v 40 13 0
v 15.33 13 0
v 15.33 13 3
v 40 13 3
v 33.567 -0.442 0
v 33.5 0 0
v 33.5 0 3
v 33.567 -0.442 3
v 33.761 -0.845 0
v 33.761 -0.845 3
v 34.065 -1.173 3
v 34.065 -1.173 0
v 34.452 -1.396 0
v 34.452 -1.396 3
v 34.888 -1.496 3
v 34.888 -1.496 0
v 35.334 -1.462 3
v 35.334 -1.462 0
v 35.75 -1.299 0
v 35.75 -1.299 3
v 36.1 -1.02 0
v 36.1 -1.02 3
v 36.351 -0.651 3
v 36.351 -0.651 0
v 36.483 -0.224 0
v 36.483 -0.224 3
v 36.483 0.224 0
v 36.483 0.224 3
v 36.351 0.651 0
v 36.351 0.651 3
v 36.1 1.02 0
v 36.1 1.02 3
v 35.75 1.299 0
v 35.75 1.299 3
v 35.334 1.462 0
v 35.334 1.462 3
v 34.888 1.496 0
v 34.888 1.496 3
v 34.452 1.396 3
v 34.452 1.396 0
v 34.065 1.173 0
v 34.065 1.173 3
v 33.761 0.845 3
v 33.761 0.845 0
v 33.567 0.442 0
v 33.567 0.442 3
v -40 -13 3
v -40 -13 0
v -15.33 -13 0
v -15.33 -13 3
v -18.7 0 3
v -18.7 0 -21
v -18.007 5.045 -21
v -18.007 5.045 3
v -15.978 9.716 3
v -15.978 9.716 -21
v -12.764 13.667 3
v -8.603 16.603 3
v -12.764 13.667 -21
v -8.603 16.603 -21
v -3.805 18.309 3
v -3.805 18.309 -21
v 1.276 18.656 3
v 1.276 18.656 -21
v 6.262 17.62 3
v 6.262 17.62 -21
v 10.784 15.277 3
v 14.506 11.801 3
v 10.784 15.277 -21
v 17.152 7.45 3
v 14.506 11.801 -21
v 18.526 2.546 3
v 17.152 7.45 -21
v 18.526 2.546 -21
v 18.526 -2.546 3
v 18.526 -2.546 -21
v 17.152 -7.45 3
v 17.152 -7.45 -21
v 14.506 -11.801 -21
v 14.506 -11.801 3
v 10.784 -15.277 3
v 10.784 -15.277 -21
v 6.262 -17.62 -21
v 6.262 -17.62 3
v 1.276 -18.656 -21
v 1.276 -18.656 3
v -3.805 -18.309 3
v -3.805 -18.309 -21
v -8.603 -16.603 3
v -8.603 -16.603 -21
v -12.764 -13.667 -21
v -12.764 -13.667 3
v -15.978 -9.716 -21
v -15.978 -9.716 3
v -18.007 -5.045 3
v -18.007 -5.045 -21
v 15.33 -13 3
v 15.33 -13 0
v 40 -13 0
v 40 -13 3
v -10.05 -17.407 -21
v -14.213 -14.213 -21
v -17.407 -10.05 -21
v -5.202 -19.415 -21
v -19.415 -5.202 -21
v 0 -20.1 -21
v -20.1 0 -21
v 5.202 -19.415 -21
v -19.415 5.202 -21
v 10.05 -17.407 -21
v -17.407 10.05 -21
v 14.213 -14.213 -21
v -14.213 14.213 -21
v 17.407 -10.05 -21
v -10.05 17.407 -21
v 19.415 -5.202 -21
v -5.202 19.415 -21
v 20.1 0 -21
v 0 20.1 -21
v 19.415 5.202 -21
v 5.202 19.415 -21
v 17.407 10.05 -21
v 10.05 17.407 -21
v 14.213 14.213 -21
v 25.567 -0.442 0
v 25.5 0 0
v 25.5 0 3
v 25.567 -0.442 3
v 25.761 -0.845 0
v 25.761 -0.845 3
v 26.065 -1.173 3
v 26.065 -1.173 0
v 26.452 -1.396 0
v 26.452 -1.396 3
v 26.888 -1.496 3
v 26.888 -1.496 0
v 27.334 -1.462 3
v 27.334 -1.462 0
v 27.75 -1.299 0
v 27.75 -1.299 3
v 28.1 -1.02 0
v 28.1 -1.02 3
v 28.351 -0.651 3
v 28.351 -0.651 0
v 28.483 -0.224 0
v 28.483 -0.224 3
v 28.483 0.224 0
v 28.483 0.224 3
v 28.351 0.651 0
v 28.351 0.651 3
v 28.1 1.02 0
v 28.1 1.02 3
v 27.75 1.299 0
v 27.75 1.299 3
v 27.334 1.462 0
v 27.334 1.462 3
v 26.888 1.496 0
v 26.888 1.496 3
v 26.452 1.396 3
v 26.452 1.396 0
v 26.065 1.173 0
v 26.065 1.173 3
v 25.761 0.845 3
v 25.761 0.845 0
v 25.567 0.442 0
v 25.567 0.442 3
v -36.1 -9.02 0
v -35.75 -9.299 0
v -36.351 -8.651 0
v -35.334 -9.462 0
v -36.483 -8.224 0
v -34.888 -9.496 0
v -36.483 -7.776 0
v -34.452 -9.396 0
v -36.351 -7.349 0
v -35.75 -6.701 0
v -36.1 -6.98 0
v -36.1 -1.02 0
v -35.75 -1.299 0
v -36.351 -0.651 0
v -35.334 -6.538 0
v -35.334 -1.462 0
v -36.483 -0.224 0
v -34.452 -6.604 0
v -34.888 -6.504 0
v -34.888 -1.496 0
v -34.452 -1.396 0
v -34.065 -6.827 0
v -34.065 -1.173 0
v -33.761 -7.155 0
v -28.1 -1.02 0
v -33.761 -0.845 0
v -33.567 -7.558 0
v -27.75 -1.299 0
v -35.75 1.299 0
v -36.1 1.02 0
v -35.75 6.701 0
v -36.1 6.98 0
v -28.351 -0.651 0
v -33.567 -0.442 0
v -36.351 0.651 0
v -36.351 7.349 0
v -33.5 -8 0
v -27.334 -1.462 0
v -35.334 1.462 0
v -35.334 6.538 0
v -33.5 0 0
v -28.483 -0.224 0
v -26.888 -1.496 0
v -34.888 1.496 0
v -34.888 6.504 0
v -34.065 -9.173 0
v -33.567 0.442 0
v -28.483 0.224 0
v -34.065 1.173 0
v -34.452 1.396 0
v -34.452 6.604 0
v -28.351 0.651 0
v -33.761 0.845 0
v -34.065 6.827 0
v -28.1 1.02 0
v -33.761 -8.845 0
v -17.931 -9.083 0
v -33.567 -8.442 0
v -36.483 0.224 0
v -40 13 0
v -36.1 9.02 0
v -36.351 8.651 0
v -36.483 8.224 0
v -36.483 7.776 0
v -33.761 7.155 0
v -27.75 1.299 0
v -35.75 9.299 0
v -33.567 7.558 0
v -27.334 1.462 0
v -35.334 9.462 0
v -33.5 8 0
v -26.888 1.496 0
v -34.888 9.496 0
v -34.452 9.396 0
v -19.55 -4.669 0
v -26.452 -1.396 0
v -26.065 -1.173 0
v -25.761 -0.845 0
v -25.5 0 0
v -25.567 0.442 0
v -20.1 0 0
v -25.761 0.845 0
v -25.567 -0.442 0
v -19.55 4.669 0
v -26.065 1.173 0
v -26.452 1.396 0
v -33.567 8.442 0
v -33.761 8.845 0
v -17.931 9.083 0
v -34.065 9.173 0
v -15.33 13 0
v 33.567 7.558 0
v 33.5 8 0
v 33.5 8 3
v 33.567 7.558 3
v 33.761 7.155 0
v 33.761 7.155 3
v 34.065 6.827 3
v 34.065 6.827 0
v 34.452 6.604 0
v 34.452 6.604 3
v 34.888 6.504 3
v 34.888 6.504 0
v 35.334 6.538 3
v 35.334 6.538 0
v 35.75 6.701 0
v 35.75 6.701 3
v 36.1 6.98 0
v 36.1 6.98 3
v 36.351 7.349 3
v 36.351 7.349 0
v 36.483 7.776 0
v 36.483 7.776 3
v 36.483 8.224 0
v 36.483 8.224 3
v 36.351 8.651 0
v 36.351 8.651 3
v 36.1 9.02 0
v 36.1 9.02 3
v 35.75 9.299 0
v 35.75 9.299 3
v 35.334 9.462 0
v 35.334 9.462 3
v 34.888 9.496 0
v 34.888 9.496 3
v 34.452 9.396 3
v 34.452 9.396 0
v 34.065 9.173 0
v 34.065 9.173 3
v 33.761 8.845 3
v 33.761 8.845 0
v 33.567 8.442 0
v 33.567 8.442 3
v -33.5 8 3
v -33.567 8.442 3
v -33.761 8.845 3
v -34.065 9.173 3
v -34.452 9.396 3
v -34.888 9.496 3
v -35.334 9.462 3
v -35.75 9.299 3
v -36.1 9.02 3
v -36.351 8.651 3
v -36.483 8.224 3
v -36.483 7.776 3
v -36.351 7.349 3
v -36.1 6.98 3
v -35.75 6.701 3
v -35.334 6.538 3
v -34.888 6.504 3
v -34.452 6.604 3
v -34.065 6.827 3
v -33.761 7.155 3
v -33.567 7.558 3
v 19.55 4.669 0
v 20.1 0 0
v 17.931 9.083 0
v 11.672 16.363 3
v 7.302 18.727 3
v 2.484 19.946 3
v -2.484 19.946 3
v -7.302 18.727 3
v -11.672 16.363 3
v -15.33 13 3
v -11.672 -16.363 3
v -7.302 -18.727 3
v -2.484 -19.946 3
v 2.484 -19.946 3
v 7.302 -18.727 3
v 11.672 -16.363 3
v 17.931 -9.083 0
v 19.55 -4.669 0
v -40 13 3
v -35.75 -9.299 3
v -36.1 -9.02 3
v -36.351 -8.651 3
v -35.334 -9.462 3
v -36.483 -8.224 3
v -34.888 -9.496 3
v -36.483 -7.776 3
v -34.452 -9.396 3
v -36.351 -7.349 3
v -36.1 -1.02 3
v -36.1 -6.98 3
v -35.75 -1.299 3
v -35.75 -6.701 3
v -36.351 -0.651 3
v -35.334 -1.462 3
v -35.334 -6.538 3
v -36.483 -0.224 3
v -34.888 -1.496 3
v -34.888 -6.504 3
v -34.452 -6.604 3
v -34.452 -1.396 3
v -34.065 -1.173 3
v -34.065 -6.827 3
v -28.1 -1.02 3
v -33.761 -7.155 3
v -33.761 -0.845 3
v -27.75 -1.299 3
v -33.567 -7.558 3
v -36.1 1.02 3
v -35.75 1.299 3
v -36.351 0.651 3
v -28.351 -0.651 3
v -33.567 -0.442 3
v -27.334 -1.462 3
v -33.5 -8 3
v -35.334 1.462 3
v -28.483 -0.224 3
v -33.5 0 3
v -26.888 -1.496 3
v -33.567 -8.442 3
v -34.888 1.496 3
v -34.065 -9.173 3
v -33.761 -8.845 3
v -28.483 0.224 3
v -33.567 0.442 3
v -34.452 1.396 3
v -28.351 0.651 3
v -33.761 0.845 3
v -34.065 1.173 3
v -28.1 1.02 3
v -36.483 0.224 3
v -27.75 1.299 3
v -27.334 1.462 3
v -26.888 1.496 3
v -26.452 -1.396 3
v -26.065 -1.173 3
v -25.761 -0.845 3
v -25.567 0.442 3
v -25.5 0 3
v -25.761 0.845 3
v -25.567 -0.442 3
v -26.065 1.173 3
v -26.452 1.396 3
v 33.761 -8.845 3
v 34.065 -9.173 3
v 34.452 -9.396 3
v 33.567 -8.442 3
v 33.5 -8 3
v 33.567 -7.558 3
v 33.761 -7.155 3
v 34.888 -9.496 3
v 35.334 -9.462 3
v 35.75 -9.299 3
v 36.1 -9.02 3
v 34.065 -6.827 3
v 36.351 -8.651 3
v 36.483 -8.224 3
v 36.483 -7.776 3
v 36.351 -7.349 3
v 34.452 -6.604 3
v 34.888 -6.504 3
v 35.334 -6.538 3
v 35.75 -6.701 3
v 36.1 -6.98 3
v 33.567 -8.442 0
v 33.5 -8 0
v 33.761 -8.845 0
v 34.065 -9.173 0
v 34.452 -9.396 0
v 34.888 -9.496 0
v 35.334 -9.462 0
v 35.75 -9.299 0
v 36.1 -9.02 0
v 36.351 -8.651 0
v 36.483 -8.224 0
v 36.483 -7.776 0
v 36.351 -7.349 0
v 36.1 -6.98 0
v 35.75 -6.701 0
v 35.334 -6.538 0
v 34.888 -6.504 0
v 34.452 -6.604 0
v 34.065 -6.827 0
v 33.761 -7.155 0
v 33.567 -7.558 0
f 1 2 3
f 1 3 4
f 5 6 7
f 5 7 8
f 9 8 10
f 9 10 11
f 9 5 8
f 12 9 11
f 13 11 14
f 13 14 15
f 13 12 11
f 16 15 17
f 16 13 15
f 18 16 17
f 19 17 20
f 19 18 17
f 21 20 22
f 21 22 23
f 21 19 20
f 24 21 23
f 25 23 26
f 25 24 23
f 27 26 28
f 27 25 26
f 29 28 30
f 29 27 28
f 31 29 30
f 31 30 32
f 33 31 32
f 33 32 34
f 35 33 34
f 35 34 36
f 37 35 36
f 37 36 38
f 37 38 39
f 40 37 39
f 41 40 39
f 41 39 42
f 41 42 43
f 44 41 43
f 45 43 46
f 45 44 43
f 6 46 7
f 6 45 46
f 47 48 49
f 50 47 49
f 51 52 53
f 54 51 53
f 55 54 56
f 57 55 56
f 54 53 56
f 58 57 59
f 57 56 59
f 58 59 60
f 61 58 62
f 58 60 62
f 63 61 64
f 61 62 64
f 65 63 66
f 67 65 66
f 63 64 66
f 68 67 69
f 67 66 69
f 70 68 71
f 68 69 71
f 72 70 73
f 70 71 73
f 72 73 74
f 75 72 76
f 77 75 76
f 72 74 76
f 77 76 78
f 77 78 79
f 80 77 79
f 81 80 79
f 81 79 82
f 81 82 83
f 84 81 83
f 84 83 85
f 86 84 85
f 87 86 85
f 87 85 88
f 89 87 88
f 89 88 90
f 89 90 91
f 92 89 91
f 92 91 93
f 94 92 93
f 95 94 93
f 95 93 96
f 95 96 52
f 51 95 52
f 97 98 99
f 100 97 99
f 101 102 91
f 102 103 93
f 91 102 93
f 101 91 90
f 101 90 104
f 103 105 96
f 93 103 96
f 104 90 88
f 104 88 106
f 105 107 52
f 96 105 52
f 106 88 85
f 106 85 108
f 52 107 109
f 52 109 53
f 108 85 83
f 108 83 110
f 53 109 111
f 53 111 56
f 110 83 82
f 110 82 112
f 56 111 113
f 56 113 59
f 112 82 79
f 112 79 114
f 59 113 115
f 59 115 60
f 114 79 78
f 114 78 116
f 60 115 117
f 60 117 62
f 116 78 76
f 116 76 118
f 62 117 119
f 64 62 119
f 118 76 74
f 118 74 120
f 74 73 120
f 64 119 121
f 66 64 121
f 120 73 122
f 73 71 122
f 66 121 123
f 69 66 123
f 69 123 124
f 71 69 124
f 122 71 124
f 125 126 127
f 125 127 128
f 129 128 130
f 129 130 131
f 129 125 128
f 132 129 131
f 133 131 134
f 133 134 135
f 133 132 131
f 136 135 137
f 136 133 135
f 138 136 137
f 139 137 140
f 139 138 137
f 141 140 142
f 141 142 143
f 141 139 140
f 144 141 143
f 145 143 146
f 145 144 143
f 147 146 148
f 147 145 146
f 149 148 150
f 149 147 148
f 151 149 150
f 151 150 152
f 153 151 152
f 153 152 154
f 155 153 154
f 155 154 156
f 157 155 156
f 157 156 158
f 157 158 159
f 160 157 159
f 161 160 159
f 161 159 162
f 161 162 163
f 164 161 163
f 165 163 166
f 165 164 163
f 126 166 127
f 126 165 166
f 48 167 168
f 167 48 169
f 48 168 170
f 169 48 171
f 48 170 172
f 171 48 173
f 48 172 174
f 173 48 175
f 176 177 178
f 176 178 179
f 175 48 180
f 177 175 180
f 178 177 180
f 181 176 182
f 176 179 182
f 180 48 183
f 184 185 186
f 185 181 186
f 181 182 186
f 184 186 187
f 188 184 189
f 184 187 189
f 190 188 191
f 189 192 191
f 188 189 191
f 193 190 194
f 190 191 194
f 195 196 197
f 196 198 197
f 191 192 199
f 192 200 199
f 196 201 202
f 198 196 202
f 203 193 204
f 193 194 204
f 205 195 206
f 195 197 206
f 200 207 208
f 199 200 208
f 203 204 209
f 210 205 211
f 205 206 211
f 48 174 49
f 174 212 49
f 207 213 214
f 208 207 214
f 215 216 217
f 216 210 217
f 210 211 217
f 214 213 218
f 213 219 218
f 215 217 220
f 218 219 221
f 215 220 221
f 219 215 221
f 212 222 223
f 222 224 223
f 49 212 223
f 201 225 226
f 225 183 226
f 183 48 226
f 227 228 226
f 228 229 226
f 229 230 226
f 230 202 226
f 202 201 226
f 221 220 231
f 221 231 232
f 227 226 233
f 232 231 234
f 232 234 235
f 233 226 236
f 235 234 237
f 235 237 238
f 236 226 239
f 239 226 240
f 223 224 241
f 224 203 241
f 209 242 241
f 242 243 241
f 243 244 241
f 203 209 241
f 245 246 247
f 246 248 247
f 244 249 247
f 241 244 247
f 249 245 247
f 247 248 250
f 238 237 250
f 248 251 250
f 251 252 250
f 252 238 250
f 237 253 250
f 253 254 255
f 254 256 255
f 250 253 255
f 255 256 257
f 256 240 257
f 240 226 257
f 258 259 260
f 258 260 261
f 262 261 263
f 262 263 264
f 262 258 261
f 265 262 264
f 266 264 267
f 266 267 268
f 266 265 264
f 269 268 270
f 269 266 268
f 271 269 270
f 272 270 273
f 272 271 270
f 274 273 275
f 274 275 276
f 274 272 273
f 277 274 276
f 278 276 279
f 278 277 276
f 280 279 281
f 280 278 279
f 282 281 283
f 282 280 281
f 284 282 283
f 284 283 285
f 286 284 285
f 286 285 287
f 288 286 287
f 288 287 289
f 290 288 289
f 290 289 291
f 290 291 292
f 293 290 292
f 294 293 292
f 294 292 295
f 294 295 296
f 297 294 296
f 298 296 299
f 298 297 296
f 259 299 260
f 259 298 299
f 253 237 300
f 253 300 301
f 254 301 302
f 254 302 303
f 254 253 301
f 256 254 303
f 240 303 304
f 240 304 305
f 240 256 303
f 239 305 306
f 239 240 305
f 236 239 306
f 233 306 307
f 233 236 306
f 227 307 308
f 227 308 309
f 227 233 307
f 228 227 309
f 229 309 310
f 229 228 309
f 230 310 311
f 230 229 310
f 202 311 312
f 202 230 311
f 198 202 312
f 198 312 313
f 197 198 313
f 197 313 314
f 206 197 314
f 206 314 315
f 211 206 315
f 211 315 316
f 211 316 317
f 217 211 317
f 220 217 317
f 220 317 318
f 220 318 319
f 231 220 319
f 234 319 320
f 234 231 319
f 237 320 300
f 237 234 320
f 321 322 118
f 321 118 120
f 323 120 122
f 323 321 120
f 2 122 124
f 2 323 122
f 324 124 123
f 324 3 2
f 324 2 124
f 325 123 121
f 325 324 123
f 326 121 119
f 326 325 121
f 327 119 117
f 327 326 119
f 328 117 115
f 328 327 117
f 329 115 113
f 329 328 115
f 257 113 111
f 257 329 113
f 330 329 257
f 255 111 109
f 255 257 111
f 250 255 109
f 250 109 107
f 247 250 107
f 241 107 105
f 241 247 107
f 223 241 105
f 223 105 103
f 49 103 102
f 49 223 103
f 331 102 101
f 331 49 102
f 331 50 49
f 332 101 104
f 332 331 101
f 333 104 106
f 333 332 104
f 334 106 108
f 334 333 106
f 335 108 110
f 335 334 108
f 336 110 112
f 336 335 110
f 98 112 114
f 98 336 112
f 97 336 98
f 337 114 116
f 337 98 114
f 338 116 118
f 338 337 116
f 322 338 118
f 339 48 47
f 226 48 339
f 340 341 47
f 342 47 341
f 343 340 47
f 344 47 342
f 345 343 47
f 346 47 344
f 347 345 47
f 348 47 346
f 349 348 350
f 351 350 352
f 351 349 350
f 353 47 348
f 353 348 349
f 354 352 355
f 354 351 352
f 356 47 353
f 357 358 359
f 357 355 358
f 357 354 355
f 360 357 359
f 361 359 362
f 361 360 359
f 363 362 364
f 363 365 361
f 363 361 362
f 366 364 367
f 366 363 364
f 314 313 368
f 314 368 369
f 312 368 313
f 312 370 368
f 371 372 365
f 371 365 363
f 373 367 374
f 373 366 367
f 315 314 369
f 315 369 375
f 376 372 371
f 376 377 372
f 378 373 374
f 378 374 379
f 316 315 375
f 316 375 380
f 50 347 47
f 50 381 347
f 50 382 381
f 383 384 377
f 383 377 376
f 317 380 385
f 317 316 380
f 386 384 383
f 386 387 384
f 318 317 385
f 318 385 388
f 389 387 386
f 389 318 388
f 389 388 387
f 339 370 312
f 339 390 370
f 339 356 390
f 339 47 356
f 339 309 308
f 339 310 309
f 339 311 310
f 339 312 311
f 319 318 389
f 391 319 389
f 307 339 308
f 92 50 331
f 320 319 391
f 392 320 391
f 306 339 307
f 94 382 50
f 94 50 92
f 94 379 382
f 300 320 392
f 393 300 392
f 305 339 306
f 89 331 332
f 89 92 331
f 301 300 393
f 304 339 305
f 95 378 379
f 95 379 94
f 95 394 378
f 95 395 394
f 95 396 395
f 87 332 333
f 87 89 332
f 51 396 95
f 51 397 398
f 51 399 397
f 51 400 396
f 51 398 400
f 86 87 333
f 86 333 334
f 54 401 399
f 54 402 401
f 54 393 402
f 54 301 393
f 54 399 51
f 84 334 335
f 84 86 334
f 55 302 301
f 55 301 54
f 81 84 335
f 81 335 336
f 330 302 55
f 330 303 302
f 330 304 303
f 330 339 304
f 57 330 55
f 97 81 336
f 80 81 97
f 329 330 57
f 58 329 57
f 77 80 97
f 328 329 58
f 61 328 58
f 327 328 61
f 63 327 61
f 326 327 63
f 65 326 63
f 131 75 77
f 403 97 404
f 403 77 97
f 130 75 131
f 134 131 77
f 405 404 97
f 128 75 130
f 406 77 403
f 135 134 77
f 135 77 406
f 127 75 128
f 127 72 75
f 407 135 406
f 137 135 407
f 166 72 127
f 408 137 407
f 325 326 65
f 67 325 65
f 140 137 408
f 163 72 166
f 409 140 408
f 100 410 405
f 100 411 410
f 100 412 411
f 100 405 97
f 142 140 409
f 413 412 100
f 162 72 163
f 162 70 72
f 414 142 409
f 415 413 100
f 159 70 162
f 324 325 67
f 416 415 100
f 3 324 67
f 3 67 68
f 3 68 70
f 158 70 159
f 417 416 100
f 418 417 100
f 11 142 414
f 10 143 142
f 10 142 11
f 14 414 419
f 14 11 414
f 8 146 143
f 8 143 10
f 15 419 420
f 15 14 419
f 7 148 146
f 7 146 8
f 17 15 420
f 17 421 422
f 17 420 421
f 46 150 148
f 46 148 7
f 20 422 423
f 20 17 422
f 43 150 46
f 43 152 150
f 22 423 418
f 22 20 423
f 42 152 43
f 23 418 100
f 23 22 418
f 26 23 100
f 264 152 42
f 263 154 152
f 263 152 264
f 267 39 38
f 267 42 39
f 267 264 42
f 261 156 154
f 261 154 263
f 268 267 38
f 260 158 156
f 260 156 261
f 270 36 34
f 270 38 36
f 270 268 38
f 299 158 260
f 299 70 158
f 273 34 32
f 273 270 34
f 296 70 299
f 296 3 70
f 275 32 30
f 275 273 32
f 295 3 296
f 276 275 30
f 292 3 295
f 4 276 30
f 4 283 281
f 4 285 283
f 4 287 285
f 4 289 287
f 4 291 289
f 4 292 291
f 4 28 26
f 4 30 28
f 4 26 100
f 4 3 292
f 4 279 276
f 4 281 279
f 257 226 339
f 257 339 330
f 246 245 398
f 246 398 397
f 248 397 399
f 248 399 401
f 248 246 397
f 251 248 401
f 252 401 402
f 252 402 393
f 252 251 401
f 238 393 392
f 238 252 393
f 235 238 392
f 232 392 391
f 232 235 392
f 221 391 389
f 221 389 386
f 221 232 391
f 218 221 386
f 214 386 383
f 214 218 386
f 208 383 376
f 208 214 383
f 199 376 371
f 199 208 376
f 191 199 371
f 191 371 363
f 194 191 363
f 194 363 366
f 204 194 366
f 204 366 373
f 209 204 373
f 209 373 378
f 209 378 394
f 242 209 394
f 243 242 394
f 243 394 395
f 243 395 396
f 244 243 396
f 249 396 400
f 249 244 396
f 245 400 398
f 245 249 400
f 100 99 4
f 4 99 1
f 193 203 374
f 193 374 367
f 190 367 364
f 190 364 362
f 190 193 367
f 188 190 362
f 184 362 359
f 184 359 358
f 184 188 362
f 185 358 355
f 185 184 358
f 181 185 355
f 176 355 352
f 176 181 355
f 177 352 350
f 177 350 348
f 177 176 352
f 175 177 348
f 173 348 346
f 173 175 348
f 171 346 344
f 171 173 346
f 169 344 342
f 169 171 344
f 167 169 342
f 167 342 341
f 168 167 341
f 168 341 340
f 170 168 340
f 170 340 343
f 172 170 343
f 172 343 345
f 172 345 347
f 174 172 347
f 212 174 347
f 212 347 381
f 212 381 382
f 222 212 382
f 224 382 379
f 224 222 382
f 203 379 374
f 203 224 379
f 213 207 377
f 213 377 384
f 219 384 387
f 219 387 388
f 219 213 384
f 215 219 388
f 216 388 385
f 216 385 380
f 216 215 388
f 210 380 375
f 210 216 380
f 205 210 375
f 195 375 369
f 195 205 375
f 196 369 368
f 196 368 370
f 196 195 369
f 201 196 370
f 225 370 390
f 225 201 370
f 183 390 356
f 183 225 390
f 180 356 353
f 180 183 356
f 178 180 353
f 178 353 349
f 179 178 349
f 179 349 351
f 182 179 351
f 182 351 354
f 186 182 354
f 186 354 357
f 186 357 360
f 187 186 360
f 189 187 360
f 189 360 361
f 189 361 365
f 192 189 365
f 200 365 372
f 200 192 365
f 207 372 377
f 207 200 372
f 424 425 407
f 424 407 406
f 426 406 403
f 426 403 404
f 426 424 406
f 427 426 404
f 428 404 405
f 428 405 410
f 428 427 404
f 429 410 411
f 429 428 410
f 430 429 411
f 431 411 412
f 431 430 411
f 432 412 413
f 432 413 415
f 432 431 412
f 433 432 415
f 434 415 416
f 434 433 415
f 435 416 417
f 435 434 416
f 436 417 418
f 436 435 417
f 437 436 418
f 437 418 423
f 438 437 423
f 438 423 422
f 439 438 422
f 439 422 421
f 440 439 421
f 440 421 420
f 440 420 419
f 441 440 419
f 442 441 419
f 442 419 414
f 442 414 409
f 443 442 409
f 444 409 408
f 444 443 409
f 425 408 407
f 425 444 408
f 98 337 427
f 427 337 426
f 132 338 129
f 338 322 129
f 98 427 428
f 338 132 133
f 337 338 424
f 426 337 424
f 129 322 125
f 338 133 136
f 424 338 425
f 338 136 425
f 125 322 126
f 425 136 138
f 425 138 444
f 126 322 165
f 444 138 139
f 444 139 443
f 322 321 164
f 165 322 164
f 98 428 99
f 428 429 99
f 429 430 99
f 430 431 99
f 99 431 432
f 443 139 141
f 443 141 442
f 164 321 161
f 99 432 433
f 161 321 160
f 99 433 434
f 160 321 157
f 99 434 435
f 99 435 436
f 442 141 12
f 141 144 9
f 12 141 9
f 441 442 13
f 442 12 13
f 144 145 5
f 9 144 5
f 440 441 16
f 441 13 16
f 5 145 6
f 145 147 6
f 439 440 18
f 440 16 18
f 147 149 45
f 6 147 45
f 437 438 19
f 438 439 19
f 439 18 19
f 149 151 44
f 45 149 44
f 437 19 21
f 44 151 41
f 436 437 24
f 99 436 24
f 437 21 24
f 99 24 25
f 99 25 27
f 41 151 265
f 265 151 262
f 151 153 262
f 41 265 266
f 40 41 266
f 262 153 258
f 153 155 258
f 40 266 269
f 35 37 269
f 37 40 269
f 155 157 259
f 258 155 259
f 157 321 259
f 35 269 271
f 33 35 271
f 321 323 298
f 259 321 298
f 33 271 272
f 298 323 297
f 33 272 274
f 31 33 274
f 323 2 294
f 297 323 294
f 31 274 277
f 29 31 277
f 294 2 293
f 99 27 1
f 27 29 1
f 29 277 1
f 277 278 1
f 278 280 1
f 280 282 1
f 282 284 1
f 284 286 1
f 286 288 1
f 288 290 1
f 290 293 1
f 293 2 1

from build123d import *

# Parameters (mm, degrees)
SKETCH_1_W          = 80
SKETCH_1_H          = 26
SKETCH_1_R          = 1.5
EXTRUDE_1_DEPTH     = 3
SKETCH_2_R          = 20.1
EXTRUDE_2_DEPTH     = 24
SKETCH_3_R          = 18.7
CUT_EXTRUDE_1_DEPTH = 25


with BuildPart() as part:
    # 草图1 → 凸台-拉伸1 (new body)
    with BuildSketch(Plane.XY):
        Rectangle(SKETCH_1_W, SKETCH_1_H)
        with Locations((-35, 0)):
            Circle(SKETCH_1_R, mode=Mode.SUBTRACT)
        with Locations((-27, 0)):
            Circle(SKETCH_1_R, mode=Mode.SUBTRACT)
        with Locations((-35, 8)):
            Circle(SKETCH_1_R, mode=Mode.SUBTRACT)
        with Locations((-35, -8)):
            Circle(SKETCH_1_R, mode=Mode.SUBTRACT)
        with Locations(Location((35, -8, 0), (0, 0, 180))):
            Circle(SKETCH_1_R, mode=Mode.SUBTRACT)
        with Locations(Location((35, 8, 0), (0, 0, 180))):
            Circle(SKETCH_1_R, mode=Mode.SUBTRACT)
        with Locations(Location((35, 0, 0), (0, 0, 180))):
            Circle(SKETCH_1_R, mode=Mode.SUBTRACT)
        with Locations(Location((27, 0, 0), (0, 0, 180))):
            Circle(SKETCH_1_R, mode=Mode.SUBTRACT)
    extrude(amount=EXTRUDE_1_DEPTH)

    # 草图2 → 凸台-拉伸2 (add)
    with BuildSketch(Plane.XY.offset(3)):
        Circle(SKETCH_2_R)
    extrude(amount=-EXTRUDE_2_DEPTH)

    # 草图3 → 切除-拉伸1 (cut)
    with BuildSketch(Plane(origin=(0, 0, -21), x_dir=(-1, 0, 0), z_dir=(0, 0, -1))):
        Circle(SKETCH_3_R)
    extrude(amount=-CUT_EXTRUDE_1_DEPTH, mode=Mode.SUBTRACT)


solid = part.part
